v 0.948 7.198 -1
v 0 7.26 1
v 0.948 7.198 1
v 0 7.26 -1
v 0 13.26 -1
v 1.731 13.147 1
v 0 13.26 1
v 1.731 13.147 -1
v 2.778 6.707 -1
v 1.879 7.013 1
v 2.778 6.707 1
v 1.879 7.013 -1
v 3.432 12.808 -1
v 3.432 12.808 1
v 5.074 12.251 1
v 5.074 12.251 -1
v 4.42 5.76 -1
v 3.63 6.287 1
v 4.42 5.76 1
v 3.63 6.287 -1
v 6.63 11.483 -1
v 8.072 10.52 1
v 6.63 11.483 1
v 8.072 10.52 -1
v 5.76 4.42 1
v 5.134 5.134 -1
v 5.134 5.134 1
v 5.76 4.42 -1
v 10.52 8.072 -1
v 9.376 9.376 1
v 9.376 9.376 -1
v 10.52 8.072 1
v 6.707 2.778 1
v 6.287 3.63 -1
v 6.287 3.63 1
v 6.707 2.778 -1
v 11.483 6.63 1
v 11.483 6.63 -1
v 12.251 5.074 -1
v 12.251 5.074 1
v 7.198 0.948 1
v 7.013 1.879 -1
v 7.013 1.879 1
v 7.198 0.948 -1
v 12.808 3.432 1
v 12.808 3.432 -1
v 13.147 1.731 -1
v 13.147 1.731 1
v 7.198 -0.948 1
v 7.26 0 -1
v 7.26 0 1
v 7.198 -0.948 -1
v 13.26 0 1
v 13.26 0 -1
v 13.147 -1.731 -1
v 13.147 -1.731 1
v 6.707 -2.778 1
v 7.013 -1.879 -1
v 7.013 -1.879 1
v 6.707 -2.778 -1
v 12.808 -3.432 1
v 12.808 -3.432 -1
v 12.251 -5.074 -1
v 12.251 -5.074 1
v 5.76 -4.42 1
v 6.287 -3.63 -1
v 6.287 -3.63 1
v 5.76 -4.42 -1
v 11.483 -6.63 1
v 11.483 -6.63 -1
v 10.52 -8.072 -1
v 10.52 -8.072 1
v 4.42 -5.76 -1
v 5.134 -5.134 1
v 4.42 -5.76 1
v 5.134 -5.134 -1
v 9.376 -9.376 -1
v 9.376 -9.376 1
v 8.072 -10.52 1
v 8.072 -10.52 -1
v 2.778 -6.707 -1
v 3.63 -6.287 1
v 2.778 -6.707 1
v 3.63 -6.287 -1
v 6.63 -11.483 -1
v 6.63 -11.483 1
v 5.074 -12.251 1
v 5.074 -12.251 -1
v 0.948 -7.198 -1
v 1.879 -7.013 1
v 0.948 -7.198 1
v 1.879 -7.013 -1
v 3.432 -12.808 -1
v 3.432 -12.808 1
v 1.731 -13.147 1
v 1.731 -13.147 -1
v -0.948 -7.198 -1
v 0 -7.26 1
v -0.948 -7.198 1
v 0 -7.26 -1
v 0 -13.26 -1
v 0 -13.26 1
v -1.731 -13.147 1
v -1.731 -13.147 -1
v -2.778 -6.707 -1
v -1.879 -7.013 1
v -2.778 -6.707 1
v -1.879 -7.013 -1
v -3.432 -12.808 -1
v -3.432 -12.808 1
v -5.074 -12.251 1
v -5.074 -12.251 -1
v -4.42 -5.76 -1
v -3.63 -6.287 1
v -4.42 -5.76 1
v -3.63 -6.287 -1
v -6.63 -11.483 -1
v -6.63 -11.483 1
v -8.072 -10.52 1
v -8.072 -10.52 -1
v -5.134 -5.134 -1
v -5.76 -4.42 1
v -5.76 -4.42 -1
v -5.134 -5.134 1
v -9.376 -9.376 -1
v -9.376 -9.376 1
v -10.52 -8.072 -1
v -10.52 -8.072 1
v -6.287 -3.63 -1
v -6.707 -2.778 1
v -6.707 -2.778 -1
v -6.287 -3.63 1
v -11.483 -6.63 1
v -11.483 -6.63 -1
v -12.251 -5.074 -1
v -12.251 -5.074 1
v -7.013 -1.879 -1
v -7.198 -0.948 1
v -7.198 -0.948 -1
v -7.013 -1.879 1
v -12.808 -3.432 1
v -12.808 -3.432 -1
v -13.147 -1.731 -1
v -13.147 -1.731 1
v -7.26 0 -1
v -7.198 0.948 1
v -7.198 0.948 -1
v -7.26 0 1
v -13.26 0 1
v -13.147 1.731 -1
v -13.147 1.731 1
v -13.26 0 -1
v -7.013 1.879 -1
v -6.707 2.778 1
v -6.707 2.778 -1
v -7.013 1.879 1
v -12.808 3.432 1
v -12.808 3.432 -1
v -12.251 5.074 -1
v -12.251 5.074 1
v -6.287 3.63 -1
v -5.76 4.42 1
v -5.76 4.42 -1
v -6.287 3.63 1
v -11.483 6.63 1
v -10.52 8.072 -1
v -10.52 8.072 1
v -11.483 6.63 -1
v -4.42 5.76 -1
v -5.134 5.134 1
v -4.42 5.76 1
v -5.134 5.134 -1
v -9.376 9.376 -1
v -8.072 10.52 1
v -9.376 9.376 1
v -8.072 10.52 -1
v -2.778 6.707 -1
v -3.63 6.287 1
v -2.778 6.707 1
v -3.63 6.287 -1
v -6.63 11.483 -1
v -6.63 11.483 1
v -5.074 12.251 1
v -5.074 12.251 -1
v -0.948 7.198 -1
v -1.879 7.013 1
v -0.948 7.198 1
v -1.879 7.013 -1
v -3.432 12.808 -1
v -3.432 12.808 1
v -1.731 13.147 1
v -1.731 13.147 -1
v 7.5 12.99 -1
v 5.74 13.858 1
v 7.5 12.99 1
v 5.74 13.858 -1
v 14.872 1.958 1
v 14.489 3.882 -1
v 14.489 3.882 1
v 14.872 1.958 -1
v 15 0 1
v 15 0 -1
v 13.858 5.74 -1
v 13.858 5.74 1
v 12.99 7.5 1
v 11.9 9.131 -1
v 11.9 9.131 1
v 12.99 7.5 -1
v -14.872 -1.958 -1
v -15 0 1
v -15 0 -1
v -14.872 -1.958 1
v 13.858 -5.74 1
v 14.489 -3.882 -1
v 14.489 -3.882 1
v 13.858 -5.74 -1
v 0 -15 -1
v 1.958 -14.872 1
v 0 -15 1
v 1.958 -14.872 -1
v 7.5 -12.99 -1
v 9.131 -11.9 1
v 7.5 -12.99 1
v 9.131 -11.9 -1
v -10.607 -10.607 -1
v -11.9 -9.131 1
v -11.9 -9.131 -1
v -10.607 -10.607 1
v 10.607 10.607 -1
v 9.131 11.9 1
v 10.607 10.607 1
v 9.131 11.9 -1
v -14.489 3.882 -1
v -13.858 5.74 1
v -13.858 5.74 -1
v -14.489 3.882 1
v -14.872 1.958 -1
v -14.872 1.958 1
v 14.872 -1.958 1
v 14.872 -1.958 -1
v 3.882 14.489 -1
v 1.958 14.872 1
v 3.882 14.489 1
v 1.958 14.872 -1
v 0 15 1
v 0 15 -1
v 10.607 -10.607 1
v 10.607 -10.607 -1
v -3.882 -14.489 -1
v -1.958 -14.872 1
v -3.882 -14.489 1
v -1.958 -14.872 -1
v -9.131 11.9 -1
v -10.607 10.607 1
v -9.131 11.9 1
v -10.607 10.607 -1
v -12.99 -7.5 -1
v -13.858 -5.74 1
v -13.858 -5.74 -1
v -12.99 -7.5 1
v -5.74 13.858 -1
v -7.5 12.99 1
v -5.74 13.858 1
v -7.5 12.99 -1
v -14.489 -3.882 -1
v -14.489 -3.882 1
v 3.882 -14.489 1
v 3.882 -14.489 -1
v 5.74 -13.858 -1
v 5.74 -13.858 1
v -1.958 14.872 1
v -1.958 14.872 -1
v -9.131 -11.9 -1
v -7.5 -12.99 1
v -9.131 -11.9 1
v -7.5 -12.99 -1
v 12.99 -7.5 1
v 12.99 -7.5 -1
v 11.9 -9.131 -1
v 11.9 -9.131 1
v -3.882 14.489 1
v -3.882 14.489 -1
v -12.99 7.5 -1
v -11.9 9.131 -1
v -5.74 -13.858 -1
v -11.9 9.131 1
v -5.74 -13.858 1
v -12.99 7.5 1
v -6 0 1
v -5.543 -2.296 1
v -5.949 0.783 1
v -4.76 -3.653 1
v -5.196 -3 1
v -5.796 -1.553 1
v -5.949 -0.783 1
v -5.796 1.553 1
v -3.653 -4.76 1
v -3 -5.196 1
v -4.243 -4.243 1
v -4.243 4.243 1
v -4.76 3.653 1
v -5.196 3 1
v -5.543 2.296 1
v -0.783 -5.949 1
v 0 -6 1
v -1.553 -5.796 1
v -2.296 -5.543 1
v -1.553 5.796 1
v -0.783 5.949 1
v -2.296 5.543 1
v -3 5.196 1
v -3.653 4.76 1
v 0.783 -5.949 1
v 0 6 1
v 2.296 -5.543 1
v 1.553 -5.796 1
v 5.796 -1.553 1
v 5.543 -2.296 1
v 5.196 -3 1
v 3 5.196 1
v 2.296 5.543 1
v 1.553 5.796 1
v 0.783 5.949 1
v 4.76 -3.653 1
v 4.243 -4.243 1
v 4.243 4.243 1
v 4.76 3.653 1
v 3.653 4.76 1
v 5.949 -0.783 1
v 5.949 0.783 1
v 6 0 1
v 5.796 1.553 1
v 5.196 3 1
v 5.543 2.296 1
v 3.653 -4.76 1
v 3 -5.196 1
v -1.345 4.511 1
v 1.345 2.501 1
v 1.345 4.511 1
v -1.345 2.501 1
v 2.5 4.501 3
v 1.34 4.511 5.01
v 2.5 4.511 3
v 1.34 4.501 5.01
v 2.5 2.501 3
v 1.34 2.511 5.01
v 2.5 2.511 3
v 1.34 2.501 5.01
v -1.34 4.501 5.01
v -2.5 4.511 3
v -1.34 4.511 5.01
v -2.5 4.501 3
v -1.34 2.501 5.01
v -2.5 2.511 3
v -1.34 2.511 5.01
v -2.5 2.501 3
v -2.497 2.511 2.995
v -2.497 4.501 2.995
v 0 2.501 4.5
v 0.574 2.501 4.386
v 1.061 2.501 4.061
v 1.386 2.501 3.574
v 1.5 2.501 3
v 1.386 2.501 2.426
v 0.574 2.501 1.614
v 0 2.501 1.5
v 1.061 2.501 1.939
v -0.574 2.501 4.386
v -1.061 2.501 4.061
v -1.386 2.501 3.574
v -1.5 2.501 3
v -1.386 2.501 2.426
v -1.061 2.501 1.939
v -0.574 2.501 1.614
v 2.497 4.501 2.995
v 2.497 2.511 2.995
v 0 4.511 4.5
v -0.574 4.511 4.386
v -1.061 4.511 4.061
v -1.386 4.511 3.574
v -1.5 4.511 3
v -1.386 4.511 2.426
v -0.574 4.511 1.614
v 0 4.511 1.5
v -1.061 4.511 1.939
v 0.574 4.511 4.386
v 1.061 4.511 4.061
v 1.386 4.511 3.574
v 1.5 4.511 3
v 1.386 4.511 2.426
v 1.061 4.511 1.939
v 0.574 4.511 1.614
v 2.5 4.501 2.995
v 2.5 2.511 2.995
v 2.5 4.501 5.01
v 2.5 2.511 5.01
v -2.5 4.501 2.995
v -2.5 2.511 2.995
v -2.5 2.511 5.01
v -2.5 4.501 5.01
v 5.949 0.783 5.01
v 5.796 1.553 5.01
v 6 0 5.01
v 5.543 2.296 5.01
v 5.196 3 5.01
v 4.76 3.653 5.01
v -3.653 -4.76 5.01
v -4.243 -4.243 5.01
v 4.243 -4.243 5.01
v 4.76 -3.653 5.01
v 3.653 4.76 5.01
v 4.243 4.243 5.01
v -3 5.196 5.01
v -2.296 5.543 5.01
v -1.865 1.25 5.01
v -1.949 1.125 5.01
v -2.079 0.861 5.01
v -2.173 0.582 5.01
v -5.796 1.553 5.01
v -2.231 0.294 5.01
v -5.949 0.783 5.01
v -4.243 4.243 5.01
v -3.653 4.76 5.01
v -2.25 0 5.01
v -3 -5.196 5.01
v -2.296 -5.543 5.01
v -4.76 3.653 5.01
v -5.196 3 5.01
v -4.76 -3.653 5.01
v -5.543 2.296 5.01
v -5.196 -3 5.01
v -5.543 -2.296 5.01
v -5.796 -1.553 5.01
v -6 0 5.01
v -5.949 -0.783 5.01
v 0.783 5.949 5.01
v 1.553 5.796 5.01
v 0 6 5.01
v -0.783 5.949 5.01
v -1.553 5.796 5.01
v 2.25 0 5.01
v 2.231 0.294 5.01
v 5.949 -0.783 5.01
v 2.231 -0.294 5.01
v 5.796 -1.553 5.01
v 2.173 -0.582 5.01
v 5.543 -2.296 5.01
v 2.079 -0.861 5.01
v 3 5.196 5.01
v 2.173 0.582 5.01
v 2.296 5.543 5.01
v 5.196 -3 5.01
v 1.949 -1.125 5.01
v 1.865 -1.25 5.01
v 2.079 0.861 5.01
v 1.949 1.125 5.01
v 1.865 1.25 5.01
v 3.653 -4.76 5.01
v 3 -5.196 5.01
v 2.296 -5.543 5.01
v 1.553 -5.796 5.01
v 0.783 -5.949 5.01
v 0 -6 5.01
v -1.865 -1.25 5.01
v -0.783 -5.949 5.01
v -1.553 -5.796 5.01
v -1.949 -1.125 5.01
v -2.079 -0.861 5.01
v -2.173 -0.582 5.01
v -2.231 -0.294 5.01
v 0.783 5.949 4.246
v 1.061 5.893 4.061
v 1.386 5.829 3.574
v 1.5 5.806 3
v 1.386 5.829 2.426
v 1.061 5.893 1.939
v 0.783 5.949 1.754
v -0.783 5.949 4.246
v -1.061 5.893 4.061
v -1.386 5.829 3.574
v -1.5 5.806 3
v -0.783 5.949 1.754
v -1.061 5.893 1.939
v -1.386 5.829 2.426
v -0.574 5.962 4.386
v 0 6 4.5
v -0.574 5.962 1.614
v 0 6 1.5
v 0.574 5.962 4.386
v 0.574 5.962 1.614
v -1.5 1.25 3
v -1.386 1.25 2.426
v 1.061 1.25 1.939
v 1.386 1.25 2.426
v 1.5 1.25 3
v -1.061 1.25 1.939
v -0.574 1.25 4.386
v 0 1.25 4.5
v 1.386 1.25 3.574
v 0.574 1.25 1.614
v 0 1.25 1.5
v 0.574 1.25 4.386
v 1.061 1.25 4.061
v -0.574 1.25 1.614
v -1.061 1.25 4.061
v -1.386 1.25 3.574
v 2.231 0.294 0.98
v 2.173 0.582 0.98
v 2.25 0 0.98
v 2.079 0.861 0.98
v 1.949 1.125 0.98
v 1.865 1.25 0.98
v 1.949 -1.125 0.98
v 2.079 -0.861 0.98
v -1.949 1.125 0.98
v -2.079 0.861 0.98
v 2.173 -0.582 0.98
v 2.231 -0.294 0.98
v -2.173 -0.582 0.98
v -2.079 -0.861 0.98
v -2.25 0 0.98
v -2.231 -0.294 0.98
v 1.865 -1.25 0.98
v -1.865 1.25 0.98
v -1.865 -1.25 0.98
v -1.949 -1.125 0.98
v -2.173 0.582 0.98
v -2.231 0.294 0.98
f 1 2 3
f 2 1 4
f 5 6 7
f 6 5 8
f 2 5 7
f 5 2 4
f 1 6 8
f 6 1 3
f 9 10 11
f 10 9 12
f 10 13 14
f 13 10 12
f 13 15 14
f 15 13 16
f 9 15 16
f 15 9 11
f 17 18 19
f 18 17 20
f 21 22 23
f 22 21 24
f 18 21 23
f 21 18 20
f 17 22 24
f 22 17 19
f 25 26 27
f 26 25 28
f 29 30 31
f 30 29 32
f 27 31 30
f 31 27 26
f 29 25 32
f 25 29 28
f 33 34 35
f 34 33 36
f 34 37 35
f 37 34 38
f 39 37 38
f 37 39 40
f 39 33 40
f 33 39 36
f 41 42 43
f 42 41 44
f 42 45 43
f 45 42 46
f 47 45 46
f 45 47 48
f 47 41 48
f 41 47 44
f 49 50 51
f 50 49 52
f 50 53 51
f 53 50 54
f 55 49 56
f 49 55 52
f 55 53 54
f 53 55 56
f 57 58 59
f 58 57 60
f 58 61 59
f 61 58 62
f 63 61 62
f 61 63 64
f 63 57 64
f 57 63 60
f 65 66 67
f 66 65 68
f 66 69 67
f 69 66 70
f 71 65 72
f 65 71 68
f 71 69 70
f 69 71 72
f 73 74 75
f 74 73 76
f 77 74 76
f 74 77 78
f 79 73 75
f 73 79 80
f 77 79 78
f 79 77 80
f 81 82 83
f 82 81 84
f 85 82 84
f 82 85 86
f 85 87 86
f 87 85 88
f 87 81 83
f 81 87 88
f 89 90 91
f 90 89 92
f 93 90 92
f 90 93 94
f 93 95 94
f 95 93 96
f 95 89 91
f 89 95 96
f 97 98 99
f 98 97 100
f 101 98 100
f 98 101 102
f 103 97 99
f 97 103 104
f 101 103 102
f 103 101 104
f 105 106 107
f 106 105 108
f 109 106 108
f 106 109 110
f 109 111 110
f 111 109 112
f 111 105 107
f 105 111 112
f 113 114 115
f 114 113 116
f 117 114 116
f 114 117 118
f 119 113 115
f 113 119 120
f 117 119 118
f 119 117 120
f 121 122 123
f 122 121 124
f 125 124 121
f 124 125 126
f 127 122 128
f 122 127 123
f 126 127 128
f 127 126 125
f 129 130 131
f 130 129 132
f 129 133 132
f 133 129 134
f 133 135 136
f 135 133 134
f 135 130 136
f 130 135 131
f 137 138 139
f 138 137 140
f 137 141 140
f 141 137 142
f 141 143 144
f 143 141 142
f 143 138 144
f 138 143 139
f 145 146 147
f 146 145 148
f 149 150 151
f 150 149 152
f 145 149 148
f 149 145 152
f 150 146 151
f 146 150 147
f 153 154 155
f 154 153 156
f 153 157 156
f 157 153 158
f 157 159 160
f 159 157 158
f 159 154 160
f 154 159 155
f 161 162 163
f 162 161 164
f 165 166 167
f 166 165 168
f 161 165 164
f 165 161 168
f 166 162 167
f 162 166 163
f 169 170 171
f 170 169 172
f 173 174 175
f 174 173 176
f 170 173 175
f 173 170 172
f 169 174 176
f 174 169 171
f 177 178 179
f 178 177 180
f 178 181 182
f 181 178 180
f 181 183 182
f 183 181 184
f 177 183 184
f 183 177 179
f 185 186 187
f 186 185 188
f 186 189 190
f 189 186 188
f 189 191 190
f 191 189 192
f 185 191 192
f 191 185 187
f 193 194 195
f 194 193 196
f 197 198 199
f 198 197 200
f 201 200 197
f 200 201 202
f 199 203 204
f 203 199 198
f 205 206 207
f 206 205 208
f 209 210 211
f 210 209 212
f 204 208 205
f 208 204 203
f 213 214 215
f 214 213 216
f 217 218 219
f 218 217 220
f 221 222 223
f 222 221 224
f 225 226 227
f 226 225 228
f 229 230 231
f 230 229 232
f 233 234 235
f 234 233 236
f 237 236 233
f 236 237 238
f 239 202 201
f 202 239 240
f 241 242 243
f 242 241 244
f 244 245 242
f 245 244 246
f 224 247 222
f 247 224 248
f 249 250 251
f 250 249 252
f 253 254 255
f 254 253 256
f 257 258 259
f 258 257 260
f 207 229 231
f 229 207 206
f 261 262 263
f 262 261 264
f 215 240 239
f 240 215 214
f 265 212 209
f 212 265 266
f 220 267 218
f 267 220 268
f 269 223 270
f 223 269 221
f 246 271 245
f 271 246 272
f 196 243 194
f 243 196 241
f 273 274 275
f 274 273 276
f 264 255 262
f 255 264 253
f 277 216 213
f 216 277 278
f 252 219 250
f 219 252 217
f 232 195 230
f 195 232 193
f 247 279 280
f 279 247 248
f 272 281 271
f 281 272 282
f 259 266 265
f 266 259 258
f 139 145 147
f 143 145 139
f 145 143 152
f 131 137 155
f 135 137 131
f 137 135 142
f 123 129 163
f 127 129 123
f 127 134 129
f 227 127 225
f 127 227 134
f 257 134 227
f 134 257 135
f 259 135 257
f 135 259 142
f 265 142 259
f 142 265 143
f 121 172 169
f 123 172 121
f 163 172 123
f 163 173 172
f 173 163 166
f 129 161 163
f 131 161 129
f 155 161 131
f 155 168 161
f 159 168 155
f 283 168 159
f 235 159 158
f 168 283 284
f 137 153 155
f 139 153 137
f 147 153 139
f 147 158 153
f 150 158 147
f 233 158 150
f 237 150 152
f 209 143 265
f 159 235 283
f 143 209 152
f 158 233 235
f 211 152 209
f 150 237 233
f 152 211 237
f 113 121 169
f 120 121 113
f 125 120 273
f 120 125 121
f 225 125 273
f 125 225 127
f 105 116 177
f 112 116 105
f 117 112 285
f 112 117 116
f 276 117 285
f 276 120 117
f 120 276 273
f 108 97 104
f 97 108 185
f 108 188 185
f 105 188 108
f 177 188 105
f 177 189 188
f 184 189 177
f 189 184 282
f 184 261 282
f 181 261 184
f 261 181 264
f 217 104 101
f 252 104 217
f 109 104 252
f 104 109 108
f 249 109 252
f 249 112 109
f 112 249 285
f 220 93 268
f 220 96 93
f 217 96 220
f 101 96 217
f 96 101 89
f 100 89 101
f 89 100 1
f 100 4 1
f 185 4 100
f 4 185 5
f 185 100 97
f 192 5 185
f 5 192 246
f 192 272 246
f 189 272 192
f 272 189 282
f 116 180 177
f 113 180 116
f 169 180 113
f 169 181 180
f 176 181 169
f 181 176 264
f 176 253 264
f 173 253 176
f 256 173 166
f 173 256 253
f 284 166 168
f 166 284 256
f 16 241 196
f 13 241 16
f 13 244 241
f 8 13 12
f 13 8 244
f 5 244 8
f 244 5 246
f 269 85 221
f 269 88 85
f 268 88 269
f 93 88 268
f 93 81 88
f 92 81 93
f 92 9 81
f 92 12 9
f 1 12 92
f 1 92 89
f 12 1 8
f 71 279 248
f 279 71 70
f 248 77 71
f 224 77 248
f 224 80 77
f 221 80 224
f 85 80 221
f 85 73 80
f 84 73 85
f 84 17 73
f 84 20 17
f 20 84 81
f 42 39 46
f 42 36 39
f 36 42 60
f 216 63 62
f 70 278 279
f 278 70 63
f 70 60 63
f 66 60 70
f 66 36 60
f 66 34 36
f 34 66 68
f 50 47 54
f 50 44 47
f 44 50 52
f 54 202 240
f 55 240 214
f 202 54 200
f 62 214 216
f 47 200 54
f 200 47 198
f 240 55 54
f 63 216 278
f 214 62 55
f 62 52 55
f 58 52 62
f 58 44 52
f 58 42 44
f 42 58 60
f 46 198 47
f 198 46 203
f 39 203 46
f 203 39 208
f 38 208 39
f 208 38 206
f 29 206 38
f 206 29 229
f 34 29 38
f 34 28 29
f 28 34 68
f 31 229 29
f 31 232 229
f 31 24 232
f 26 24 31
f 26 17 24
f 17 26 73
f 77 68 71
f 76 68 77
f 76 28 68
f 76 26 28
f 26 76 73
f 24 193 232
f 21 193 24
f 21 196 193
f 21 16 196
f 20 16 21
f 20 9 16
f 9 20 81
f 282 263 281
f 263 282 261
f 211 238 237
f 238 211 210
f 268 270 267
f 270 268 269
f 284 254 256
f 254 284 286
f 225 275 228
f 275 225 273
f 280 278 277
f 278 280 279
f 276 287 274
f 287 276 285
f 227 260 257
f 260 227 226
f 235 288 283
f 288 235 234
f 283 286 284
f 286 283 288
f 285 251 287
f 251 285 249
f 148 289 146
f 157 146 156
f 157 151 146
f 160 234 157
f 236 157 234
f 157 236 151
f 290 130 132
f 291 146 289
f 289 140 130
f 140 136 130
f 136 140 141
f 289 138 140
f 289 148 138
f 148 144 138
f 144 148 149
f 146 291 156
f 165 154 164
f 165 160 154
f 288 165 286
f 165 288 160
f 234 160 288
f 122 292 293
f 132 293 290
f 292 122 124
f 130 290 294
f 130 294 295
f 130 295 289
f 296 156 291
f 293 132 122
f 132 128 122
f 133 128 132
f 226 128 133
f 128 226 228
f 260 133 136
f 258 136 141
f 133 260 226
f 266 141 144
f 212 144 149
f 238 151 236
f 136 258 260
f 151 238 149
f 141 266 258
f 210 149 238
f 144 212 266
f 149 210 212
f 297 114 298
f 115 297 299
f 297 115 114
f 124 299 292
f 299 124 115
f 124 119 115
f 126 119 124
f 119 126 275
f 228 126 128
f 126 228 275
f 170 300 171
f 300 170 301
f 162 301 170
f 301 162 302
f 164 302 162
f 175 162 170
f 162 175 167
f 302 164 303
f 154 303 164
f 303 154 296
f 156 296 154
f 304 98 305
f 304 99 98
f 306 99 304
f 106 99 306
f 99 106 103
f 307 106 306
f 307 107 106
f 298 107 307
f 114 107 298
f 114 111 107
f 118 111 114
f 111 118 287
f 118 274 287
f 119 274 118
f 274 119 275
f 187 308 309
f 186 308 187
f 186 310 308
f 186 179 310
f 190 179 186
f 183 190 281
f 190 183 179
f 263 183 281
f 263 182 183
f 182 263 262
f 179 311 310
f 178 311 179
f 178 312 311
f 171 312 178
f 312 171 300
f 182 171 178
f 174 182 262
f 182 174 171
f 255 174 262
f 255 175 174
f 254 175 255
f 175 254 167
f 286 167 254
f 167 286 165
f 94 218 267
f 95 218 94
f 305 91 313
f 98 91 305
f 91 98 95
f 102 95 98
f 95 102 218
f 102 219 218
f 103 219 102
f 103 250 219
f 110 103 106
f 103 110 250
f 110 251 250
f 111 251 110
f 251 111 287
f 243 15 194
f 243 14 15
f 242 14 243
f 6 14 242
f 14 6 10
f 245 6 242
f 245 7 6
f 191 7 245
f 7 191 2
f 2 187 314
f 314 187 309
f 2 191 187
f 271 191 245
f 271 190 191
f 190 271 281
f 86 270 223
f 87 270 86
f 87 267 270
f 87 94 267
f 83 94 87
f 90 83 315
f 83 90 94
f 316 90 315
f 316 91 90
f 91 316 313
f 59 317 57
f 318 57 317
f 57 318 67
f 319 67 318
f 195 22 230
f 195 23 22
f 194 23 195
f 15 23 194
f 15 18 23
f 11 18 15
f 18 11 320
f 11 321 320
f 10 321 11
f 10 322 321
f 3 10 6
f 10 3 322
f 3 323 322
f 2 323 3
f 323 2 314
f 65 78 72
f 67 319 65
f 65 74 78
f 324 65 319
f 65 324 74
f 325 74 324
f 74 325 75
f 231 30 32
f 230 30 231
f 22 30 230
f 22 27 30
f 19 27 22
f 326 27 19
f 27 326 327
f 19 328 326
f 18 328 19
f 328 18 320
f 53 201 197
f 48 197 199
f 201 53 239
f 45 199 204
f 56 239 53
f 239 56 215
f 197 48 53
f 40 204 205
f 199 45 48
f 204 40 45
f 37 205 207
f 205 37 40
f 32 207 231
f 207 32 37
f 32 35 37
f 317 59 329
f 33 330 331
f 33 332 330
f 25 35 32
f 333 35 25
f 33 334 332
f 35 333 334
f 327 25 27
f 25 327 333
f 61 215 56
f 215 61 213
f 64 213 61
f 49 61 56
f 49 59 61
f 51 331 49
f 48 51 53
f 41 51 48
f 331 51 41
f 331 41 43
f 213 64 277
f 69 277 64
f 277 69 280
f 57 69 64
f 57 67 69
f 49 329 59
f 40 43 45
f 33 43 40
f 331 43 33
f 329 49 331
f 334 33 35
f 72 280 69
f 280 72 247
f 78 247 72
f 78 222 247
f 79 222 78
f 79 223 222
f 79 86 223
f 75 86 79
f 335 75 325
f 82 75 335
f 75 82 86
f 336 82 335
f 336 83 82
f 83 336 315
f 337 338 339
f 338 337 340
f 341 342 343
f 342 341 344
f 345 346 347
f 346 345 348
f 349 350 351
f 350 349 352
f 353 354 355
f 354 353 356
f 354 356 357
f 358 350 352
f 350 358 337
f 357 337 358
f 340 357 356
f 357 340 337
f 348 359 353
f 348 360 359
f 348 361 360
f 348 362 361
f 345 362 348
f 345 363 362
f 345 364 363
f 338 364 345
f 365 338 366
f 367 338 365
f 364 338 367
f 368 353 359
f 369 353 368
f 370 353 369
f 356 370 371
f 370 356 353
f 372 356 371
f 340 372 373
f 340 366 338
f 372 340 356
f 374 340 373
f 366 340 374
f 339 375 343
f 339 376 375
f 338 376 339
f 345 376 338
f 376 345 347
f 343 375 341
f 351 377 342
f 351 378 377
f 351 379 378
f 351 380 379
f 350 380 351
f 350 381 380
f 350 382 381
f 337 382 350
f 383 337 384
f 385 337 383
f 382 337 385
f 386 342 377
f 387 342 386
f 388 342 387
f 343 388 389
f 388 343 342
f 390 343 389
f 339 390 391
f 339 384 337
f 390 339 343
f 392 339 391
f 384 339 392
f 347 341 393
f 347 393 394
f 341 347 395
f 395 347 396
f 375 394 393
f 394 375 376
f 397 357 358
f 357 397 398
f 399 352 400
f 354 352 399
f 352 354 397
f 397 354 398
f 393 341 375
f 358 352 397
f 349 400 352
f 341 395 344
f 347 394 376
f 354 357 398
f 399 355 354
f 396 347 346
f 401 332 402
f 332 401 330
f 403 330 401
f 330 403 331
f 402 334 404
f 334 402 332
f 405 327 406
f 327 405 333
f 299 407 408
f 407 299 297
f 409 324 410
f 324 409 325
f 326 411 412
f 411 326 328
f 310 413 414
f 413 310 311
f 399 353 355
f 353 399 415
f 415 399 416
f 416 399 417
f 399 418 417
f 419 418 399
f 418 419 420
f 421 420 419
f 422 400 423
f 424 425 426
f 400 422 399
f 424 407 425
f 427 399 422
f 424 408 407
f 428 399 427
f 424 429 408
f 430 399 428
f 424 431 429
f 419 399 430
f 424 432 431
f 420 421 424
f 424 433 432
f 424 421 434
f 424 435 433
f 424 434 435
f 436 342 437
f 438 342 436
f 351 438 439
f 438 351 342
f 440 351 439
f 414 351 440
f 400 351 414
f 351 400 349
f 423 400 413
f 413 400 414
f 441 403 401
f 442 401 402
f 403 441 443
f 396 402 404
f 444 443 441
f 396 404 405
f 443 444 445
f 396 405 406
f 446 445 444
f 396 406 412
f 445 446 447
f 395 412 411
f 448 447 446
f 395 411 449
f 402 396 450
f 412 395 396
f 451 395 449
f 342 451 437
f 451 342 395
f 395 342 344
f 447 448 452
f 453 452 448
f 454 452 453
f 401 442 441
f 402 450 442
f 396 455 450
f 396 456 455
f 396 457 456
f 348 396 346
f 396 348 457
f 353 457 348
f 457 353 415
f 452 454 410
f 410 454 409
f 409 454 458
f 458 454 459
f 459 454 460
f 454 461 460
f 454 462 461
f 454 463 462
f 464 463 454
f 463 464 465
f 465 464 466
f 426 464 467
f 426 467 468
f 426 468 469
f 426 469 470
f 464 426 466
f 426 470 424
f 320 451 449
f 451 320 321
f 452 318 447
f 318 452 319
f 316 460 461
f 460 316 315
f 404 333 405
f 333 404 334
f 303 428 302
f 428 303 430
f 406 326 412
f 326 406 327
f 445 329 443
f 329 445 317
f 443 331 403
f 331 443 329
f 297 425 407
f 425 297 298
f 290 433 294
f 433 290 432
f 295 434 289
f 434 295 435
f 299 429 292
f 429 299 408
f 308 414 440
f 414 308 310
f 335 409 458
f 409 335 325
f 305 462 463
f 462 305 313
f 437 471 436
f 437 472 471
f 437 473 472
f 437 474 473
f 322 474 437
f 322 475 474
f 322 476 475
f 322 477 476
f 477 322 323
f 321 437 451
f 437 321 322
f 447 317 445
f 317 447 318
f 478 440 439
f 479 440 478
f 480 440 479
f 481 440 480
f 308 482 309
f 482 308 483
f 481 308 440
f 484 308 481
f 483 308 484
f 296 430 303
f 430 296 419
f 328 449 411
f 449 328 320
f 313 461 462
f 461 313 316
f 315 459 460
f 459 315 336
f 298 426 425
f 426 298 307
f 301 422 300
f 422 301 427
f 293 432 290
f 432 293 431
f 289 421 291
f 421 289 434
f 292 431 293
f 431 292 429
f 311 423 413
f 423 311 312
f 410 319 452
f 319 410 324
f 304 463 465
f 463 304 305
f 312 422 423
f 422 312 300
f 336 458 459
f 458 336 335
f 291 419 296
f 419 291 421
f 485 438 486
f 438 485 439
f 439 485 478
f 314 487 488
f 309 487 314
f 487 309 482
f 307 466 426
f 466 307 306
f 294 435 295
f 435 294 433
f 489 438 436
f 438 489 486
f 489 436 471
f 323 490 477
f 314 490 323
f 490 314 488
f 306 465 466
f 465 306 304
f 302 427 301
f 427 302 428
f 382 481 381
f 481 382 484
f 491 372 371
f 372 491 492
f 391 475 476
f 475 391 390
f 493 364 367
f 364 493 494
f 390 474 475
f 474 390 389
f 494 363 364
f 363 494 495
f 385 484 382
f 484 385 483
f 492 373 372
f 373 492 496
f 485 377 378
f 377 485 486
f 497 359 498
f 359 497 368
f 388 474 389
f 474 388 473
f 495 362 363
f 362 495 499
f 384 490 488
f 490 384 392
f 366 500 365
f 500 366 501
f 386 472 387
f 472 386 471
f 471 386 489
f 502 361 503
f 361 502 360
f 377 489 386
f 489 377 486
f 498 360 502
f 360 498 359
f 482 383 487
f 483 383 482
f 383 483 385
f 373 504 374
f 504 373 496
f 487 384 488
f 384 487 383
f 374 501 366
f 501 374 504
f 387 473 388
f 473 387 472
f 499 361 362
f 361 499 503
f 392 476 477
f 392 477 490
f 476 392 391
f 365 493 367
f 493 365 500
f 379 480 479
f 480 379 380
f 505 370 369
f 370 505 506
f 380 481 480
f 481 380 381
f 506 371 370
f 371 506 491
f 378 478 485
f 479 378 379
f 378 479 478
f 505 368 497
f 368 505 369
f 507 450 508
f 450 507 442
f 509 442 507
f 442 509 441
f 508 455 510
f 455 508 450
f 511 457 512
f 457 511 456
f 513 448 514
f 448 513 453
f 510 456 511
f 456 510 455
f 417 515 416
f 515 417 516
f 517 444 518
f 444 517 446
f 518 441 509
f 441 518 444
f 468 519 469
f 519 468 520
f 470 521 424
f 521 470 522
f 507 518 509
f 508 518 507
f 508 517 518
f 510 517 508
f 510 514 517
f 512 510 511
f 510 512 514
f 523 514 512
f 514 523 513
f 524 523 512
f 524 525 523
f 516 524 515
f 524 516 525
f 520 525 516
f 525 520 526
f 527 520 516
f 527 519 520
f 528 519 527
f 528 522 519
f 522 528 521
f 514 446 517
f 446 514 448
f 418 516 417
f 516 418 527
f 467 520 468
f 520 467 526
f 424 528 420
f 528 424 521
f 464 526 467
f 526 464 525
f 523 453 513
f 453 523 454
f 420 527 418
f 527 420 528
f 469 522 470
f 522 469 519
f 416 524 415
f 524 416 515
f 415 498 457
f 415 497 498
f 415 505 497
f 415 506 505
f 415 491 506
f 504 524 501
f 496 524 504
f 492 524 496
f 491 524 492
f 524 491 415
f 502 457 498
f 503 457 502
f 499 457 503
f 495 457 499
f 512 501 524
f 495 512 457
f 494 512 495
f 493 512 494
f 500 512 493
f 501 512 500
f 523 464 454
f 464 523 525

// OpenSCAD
//customizable optical encoder
// James Wickware - 7/18/2016

// preview[view:north east, tilt:top diagonal]

/* [Encoder] */
// the outer diameter of the optical encoder in millimeters.
outer_diameter = 30; //[0:150] 

// the height of the encoder wheel in millimeters.
wheel_height = 2; //[0.1:0.1:20]

// the length of the slits in millimeters.
slit_length = 6; //[0:0.5:75]

// the number of slits in the encoder.
slit_count = 24; // [2:100]

// the ratio of the slit opening to the solid section between the slits. (0.5 is equal )
slit_ratio = 0.5; // [0.05:0.05:0.95]

// the distance between the outer diameter and the opening of the slits in millimeters.
rim_width =  1.75; // [0:0.25:25]



/* [Hub] */
// the diameter of the inner hub in millimeters.
hub_diameter = 12; // [0:0.25:25]

// the length that the hub shaft extends from the encoder wheel in millimeters.
hub_height = 4; // [0:0.5:50]


/* [Shaft] */
// the type of shaft 0 for circular shaft, 1 d shaft (circular with 1 flat, 2 double d shaft (circular with 2 flats), 3 for square shaft 4 for hex shaft, 5 for octagonal shaft.
shaft_type =2; //[0:Cylindrical Shaft, 1:D Type Shaft,2:Double D type Shaft,3:Square Shaft, 4:Hexagonal Shaft, 5:Octagonal Shaft]

// the diameter of the hole for the shaft in millimeters.
shaft_diameter = 4.5; //[0:0.1:20]

// Choose whether or not you want the shaft to go all the way through the encoder wheel.
shaft_goes_through_encoder =0 ; // [0:False,1:True]

// the depth of the flat from the outside edge of the shaft in millimeters (for d and double d shaft type only).
shaft_flat_depth = 1; // [0:0.1:10]


/* [Set Screw] */
// choose whether to include a hole for a set screw
set_screw = 1; // [0:False,1:True]

// the size of the set screw in millimeters
set_screw_diameter = 3; // [0:0.5:10]

// choose whether to include a slot for a set screw nut (automatically disabled when there is not enough room for it).
set_screw_nut = 1; // [0:False,1:True]

// the set screw nut diameter in millimeters. (for hex nuts, the distance from one corner to the opposite corner)
set_screw_nut_diameter = 5; // [1:0.25:14]
 
//  the set screw nut thickness in millimeters
set_screw_nut_thickness = 2; //[0.25:0.25:10]

/* [Hidden] */

// the outer radius
outer_radius = max(outer_diameter/2, hub_diameter/2);

// the hub radius.
hub_radius = hub_diameter/2;
shaft_radius = shaft_diameter/2;

// the depth of the hole for the shaft in millimeters.
shaft_depth = hub_height + (wheel_height*shaft_goes_through_encoder);  

// calcuate whether or not the set screw and or nut can safely be included.
min_set_screw_nut_diameter = set_screw_diameter + 0.5;
max_set_screw_nut_diameter = (hub_diameter - shaft_diameter) * 0.6; // allow 60% of distance between shaft and hub
max_set_screw_nut_thickness = (hub_radius - shaft_radius) * 0.6; // allow 60% of distance between shaft and hub

can_have_screw =  (hub_height-0.99 > set_screw_diameter)  ? 1:0 ;
  
can_have_nut =  ((set_screw_diameter > 0) ? 1: 0)
                 * ((set_screw_diameter < set_screw_nut_diameter) ? 1:0)
                * ((set_screw_nut_thickness < max_set_screw_nut_thickness) ? 1:0) 
                * set_screw_nut
                * can_have_screw;
echo(can_have_screw);
echo(can_have_nut);

set_screw_nut_offset = (((shaft_type == 0) ? 1:0) * .95)
                       +(((shaft_type == 1) ? 1:0) * .85)
                       +(((shaft_type == 2) ? 1:0) * .85)
                       +(((shaft_type == 3) ? 1:0) * .925)
                       +(((shaft_type == 4) ? 1:0) * .925)
                       +(((shaft_type == 5) ? 1:0) * .925)
                       +(((shaft_type == 6) ? 1:0) * .925)
                       +(((shaft_type == 7) ? 1:0) * .925)
                       +(((shaft_type == 8) ? 1:0) * .925)
                       ;
                       
                       
                       echo(set_screw_nut_offset);
// fudge factor to prevent coplanar boolean issues
fudge = 0.01;
difference(){
    union(){
 
        // Setup variables for wheel
        outer_rad = max((outer_radius - rim_width ) + fudge, hub_radius + fudge) ;
        inner_rad = max((outer_radius - rim_width - max(slit_length,0)) + fudge , hub_radius + fudge );
        step = 360/slit_count;
        half_step = step/2;
        qtr_step =  half_step / 2 ;       
        
        echo("step");
        echo (step);
        ratio_angle = (slit_ratio-0.5) * half_step;
        // don't create slits if some touch-hard has made the hub too big
        if(outer_rad > inner_rad){ 
            // create the wheel
            difference(){
                cylinder(r = outer_diameter/2, h= wheel_height, $fn = slit_count * 2, center = true);
             
                if( slit_count%2 == 0){

                    // create slits
                    for (i = [0 :  step : 360 - fudge  ])
                    {
                        points = [
                        [ sin(i +ratio_angle)*outer_rad, cos(i+ratio_angle)*outer_rad , -wheel_height ],  
                        [ sin(i +ratio_angle)*inner_rad, cos(i+ratio_angle)*inner_rad,  -wheel_height ], 
                        [ sin(i+half_step - ratio_angle)*inner_rad , cos(i+half_step- ratio_angle)*inner_rad, -wheel_height ],  
                        [ sin(i+half_step - ratio_angle)*outer_rad,  cos(i+half_step- ratio_angle)*outer_rad, -wheel_height ],
                        [ sin(i+ratio_angle)*outer_rad, cos(i+ratio_angle)*outer_rad,  wheel_height ],
                        [ sin(i+ratio_angle)*inner_rad, cos(i+ratio_angle)*inner_rad,  wheel_height ],
                        [ sin(i+half_step - ratio_angle)*inner_rad , cos(i+half_step- ratio_angle)*inner_rad,  wheel_height ],
                        [ sin(i+half_step - ratio_angle)*outer_rad,  cos(i+half_step- ratio_angle)*outer_rad,  wheel_height ]
                        ];

                        faces = [
                        [0,1,2,3],   
                        [4,5,1,0],   
                        [7,6,5,4],   
                        [5,6,2,1],   
                        [6,7,3,2],  
                        [7,4,0,3]];  

                        rotate(0,0,i)
                        polyhedron( points, faces ) ; 
                    } 
                }
                else{   
                    for (i = [0 :  step : 360  - fudge])
                    {
                        points = [
                        [ sin(i-qtr_step)*outer_rad, cos(i-qtr_step)*outer_rad , -wheel_height ],  
                        [ sin(i-qtr_step)*inner_rad, cos(i-qtr_step)*inner_rad,  -wheel_height ], 
                        [ sin(i+qtr_step)*inner_rad , cos(i+qtr_step)*inner_rad, -wheel_height ],  
                        [ sin(i+qtr_step)*outer_rad,  cos(i+qtr_step)*outer_rad, -wheel_height ],
                        [ sin(i-qtr_step)*outer_rad, cos(i-qtr_step)*outer_rad,  wheel_height ],
                        [ sin(i-qtr_step)*inner_rad, cos(i-qtr_step)*inner_rad,  wheel_height ],
                        [ sin(i+qtr_step)*inner_rad , cos(i+qtr_step)*inner_rad,  wheel_height ],
                        [ sin(i+qtr_step)*outer_rad,  cos(i+qtr_step)*outer_rad,  wheel_height ]
                        ];

                        faces = [
                        [0,1,2,3],   
                        [4,5,1,0],   
                        [7,6,5,4],   
                        [5,6,2,1],   
                        [6,7,3,2],  
                        [7,4,0,3]];  

                        rotate(0,0,i)
                        polyhedron( points, faces ) ;
                    }
                }
                
            }
        }
        
        // create hub
        if(hub_height > 0){
            if(set_screw == 1 && set_screw_diameter > 0 && can_have_screw == 1){
                difference(){
                  translate([0,0, ((hub_height/2) + (wheel_height /2))] )       
                  cylinder(r= min(hub_diameter/2, (outer_diameter/2)-fudge ), h = hub_height +(fudge*2), $fn = slit_count *2, center = true);
                    
                    // set screw hole
                    translate([0,0, ((hub_height/2) + (wheel_height/2 ))] ) 
                    rotate([-90,0,0]) 
                     cylinder(r=set_screw_diameter/2, h=hub_diameter, $fn=16);
                    if(can_have_nut == 1){
                    // set screw nut
                   translate([0,(hub_radius - ((hub_radius-shaft_radius)/2))*set_screw_nut_offset, ((hub_height/2) + (wheel_height/2 ))] )     
                    rotate([90,00,00])
                    cylinder(r=max(min_set_screw_nut_diameter/2,set_screw_nut_diameter/2), h=max(set_screw_nut_thickness,0.25) +fudge, $fn=6, center = true);
                    
                   translate([0,(hub_radius - ((hub_radius-shaft_radius)/2))*set_screw_nut_offset, ((hub_height/2) + (wheel_height/2 )) + 
                    (((hub_height/2) + (wheel_height/2 )+set_screw_nut_diameter /2 )-fudge) /2] )  
                    cube([max(min_set_screw_nut_diameter ,set_screw_nut_diameter ) ,max(set_screw_nut_thickness,0.25)-fudge,(((hub_height/2) + (wheel_height/2 )+max(min_set_screw_nut_diameter ,set_screw_nut_diameter ) /2 ))  ],center=true);
                    }
                    
                    }
            }
            else {
                translate([0,0, ((hub_height/2) + (wheel_height /2))] )       
                cylinder(r= min(hub_diameter/2, (outer_diameter/2)-fudge ), h = hub_height +(fudge*2), $fn = slit_count *2, center = true);        
            }
        }
    };
 
 // shaft
    // cylindrical shaft
    if(shaft_type == 0){
        translate([0,0, ((shaft_depth/2) + (wheel_height /2) + (hub_height ))]) // move shaft to the top of the hub
        translate([0,0,-min(shaft_depth, hub_height+wheel_height)]) // insert the shaft until it hits bottom >:)

        cylinder(r= shaft_diameter/2, h=shaft_depth + (fudge*4) , $fn = max(slit_count*2, 6) ,center = true);
    }
    
    // d type shaft
    if(shaft_type == 1)
    {
        translate([0,0, ((shaft_depth/2) + (wheel_height /2) + (hub_height ))]) // move shaft to the top of the hub
        translate([0,0,-min(shaft_depth, hub_height+wheel_height)]) // insert the shaft until it hits bottom >:)
    
        difference(){
            cylinder(r= shaft_diameter/2, h=shaft_depth + (fudge*4) , $fn = max(slit_count*2, 6) ,center = true);    
       
            translate([0, max( shaft_diameter - shaft_flat_depth , shaft_diameter/2),0  ]) 
            cube ( [shaft_diameter*2,shaft_diameter, shaft_depth*2 ], center = true)  ; 
       }  
    }

    // double d type shaft -- double D = big breasts -- 
    if (shaft_type == 2)
    {
        translate([0,0, ((shaft_depth/2) + (wheel_height /2) + (hub_height ))]) // move shaft to the top of the hub
        translate([0,0,-min(shaft_depth, hub_height+wheel_height)]) // insert the shaft until it hits bottom >:)
    
        difference(){
            cylinder(r= shaft_diameter/2, h=shaft_depth + (fudge*4) , $fn = max(slit_count*2, 6) ,center = true);    
         
            translate([0, max( shaft_diameter - shaft_flat_depth , shaft_diameter/2),0  ]) 
            cube ( [shaft_diameter*2,shaft_diameter, shaft_depth*2 ], center = true); 
         
            translate([0, min( -( shaft_diameter - shaft_flat_depth), -(shaft_diameter/2)),0  ]) 
            cube ( [shaft_diameter*2,shaft_diameter, shaft_depth*2 ], center = true); 
        }  
    }
    
    // square shaft
    if (shaft_type == 3)
    {
        translate([0,0, ((shaft_depth/2) + (wheel_height /2) + (hub_height ))]) // move shaft to the top of the hub
        translate([0,0,-min(shaft_depth, hub_height+wheel_height)]) // insert the shaft until it hits bottom >:)
        rotate([0,0,45]) 
        cylinder(r= shaft_diameter/2, h=shaft_depth + (fudge*4) , $fn = 4 ,center = true);
    }
    
    // hex shaft
    if (shaft_type == 4)
    {
        translate([0,0, ((shaft_depth/2) + (wheel_height /2) + (hub_height ))]) // move shaft to the top of the hub
        translate([0,0,-min(shaft_depth, hub_height+wheel_height)]) // insert the shaft until it hits bottom >:)
    
        cylinder(r= shaft_diameter/2, h=shaft_depth + (fudge*4) , $fn =   6  ,center = true);
    }
    
    // octopus shaft
    if (shaft_type == 5)
    {
        translate([0,0, ((shaft_depth/2) + (wheel_height /2) + (hub_height ))]) // move shaft to the top of the hub
        translate([0,0,-min(shaft_depth, hub_height+wheel_height)]) // insert the shaft until it hits bottom >:)
      rotate([0,0,22.5]) 
        cylinder(r= shaft_diameter/2, h=shaft_depth + (fudge*4) , $fn =   8  ,center = true);
    }
}
